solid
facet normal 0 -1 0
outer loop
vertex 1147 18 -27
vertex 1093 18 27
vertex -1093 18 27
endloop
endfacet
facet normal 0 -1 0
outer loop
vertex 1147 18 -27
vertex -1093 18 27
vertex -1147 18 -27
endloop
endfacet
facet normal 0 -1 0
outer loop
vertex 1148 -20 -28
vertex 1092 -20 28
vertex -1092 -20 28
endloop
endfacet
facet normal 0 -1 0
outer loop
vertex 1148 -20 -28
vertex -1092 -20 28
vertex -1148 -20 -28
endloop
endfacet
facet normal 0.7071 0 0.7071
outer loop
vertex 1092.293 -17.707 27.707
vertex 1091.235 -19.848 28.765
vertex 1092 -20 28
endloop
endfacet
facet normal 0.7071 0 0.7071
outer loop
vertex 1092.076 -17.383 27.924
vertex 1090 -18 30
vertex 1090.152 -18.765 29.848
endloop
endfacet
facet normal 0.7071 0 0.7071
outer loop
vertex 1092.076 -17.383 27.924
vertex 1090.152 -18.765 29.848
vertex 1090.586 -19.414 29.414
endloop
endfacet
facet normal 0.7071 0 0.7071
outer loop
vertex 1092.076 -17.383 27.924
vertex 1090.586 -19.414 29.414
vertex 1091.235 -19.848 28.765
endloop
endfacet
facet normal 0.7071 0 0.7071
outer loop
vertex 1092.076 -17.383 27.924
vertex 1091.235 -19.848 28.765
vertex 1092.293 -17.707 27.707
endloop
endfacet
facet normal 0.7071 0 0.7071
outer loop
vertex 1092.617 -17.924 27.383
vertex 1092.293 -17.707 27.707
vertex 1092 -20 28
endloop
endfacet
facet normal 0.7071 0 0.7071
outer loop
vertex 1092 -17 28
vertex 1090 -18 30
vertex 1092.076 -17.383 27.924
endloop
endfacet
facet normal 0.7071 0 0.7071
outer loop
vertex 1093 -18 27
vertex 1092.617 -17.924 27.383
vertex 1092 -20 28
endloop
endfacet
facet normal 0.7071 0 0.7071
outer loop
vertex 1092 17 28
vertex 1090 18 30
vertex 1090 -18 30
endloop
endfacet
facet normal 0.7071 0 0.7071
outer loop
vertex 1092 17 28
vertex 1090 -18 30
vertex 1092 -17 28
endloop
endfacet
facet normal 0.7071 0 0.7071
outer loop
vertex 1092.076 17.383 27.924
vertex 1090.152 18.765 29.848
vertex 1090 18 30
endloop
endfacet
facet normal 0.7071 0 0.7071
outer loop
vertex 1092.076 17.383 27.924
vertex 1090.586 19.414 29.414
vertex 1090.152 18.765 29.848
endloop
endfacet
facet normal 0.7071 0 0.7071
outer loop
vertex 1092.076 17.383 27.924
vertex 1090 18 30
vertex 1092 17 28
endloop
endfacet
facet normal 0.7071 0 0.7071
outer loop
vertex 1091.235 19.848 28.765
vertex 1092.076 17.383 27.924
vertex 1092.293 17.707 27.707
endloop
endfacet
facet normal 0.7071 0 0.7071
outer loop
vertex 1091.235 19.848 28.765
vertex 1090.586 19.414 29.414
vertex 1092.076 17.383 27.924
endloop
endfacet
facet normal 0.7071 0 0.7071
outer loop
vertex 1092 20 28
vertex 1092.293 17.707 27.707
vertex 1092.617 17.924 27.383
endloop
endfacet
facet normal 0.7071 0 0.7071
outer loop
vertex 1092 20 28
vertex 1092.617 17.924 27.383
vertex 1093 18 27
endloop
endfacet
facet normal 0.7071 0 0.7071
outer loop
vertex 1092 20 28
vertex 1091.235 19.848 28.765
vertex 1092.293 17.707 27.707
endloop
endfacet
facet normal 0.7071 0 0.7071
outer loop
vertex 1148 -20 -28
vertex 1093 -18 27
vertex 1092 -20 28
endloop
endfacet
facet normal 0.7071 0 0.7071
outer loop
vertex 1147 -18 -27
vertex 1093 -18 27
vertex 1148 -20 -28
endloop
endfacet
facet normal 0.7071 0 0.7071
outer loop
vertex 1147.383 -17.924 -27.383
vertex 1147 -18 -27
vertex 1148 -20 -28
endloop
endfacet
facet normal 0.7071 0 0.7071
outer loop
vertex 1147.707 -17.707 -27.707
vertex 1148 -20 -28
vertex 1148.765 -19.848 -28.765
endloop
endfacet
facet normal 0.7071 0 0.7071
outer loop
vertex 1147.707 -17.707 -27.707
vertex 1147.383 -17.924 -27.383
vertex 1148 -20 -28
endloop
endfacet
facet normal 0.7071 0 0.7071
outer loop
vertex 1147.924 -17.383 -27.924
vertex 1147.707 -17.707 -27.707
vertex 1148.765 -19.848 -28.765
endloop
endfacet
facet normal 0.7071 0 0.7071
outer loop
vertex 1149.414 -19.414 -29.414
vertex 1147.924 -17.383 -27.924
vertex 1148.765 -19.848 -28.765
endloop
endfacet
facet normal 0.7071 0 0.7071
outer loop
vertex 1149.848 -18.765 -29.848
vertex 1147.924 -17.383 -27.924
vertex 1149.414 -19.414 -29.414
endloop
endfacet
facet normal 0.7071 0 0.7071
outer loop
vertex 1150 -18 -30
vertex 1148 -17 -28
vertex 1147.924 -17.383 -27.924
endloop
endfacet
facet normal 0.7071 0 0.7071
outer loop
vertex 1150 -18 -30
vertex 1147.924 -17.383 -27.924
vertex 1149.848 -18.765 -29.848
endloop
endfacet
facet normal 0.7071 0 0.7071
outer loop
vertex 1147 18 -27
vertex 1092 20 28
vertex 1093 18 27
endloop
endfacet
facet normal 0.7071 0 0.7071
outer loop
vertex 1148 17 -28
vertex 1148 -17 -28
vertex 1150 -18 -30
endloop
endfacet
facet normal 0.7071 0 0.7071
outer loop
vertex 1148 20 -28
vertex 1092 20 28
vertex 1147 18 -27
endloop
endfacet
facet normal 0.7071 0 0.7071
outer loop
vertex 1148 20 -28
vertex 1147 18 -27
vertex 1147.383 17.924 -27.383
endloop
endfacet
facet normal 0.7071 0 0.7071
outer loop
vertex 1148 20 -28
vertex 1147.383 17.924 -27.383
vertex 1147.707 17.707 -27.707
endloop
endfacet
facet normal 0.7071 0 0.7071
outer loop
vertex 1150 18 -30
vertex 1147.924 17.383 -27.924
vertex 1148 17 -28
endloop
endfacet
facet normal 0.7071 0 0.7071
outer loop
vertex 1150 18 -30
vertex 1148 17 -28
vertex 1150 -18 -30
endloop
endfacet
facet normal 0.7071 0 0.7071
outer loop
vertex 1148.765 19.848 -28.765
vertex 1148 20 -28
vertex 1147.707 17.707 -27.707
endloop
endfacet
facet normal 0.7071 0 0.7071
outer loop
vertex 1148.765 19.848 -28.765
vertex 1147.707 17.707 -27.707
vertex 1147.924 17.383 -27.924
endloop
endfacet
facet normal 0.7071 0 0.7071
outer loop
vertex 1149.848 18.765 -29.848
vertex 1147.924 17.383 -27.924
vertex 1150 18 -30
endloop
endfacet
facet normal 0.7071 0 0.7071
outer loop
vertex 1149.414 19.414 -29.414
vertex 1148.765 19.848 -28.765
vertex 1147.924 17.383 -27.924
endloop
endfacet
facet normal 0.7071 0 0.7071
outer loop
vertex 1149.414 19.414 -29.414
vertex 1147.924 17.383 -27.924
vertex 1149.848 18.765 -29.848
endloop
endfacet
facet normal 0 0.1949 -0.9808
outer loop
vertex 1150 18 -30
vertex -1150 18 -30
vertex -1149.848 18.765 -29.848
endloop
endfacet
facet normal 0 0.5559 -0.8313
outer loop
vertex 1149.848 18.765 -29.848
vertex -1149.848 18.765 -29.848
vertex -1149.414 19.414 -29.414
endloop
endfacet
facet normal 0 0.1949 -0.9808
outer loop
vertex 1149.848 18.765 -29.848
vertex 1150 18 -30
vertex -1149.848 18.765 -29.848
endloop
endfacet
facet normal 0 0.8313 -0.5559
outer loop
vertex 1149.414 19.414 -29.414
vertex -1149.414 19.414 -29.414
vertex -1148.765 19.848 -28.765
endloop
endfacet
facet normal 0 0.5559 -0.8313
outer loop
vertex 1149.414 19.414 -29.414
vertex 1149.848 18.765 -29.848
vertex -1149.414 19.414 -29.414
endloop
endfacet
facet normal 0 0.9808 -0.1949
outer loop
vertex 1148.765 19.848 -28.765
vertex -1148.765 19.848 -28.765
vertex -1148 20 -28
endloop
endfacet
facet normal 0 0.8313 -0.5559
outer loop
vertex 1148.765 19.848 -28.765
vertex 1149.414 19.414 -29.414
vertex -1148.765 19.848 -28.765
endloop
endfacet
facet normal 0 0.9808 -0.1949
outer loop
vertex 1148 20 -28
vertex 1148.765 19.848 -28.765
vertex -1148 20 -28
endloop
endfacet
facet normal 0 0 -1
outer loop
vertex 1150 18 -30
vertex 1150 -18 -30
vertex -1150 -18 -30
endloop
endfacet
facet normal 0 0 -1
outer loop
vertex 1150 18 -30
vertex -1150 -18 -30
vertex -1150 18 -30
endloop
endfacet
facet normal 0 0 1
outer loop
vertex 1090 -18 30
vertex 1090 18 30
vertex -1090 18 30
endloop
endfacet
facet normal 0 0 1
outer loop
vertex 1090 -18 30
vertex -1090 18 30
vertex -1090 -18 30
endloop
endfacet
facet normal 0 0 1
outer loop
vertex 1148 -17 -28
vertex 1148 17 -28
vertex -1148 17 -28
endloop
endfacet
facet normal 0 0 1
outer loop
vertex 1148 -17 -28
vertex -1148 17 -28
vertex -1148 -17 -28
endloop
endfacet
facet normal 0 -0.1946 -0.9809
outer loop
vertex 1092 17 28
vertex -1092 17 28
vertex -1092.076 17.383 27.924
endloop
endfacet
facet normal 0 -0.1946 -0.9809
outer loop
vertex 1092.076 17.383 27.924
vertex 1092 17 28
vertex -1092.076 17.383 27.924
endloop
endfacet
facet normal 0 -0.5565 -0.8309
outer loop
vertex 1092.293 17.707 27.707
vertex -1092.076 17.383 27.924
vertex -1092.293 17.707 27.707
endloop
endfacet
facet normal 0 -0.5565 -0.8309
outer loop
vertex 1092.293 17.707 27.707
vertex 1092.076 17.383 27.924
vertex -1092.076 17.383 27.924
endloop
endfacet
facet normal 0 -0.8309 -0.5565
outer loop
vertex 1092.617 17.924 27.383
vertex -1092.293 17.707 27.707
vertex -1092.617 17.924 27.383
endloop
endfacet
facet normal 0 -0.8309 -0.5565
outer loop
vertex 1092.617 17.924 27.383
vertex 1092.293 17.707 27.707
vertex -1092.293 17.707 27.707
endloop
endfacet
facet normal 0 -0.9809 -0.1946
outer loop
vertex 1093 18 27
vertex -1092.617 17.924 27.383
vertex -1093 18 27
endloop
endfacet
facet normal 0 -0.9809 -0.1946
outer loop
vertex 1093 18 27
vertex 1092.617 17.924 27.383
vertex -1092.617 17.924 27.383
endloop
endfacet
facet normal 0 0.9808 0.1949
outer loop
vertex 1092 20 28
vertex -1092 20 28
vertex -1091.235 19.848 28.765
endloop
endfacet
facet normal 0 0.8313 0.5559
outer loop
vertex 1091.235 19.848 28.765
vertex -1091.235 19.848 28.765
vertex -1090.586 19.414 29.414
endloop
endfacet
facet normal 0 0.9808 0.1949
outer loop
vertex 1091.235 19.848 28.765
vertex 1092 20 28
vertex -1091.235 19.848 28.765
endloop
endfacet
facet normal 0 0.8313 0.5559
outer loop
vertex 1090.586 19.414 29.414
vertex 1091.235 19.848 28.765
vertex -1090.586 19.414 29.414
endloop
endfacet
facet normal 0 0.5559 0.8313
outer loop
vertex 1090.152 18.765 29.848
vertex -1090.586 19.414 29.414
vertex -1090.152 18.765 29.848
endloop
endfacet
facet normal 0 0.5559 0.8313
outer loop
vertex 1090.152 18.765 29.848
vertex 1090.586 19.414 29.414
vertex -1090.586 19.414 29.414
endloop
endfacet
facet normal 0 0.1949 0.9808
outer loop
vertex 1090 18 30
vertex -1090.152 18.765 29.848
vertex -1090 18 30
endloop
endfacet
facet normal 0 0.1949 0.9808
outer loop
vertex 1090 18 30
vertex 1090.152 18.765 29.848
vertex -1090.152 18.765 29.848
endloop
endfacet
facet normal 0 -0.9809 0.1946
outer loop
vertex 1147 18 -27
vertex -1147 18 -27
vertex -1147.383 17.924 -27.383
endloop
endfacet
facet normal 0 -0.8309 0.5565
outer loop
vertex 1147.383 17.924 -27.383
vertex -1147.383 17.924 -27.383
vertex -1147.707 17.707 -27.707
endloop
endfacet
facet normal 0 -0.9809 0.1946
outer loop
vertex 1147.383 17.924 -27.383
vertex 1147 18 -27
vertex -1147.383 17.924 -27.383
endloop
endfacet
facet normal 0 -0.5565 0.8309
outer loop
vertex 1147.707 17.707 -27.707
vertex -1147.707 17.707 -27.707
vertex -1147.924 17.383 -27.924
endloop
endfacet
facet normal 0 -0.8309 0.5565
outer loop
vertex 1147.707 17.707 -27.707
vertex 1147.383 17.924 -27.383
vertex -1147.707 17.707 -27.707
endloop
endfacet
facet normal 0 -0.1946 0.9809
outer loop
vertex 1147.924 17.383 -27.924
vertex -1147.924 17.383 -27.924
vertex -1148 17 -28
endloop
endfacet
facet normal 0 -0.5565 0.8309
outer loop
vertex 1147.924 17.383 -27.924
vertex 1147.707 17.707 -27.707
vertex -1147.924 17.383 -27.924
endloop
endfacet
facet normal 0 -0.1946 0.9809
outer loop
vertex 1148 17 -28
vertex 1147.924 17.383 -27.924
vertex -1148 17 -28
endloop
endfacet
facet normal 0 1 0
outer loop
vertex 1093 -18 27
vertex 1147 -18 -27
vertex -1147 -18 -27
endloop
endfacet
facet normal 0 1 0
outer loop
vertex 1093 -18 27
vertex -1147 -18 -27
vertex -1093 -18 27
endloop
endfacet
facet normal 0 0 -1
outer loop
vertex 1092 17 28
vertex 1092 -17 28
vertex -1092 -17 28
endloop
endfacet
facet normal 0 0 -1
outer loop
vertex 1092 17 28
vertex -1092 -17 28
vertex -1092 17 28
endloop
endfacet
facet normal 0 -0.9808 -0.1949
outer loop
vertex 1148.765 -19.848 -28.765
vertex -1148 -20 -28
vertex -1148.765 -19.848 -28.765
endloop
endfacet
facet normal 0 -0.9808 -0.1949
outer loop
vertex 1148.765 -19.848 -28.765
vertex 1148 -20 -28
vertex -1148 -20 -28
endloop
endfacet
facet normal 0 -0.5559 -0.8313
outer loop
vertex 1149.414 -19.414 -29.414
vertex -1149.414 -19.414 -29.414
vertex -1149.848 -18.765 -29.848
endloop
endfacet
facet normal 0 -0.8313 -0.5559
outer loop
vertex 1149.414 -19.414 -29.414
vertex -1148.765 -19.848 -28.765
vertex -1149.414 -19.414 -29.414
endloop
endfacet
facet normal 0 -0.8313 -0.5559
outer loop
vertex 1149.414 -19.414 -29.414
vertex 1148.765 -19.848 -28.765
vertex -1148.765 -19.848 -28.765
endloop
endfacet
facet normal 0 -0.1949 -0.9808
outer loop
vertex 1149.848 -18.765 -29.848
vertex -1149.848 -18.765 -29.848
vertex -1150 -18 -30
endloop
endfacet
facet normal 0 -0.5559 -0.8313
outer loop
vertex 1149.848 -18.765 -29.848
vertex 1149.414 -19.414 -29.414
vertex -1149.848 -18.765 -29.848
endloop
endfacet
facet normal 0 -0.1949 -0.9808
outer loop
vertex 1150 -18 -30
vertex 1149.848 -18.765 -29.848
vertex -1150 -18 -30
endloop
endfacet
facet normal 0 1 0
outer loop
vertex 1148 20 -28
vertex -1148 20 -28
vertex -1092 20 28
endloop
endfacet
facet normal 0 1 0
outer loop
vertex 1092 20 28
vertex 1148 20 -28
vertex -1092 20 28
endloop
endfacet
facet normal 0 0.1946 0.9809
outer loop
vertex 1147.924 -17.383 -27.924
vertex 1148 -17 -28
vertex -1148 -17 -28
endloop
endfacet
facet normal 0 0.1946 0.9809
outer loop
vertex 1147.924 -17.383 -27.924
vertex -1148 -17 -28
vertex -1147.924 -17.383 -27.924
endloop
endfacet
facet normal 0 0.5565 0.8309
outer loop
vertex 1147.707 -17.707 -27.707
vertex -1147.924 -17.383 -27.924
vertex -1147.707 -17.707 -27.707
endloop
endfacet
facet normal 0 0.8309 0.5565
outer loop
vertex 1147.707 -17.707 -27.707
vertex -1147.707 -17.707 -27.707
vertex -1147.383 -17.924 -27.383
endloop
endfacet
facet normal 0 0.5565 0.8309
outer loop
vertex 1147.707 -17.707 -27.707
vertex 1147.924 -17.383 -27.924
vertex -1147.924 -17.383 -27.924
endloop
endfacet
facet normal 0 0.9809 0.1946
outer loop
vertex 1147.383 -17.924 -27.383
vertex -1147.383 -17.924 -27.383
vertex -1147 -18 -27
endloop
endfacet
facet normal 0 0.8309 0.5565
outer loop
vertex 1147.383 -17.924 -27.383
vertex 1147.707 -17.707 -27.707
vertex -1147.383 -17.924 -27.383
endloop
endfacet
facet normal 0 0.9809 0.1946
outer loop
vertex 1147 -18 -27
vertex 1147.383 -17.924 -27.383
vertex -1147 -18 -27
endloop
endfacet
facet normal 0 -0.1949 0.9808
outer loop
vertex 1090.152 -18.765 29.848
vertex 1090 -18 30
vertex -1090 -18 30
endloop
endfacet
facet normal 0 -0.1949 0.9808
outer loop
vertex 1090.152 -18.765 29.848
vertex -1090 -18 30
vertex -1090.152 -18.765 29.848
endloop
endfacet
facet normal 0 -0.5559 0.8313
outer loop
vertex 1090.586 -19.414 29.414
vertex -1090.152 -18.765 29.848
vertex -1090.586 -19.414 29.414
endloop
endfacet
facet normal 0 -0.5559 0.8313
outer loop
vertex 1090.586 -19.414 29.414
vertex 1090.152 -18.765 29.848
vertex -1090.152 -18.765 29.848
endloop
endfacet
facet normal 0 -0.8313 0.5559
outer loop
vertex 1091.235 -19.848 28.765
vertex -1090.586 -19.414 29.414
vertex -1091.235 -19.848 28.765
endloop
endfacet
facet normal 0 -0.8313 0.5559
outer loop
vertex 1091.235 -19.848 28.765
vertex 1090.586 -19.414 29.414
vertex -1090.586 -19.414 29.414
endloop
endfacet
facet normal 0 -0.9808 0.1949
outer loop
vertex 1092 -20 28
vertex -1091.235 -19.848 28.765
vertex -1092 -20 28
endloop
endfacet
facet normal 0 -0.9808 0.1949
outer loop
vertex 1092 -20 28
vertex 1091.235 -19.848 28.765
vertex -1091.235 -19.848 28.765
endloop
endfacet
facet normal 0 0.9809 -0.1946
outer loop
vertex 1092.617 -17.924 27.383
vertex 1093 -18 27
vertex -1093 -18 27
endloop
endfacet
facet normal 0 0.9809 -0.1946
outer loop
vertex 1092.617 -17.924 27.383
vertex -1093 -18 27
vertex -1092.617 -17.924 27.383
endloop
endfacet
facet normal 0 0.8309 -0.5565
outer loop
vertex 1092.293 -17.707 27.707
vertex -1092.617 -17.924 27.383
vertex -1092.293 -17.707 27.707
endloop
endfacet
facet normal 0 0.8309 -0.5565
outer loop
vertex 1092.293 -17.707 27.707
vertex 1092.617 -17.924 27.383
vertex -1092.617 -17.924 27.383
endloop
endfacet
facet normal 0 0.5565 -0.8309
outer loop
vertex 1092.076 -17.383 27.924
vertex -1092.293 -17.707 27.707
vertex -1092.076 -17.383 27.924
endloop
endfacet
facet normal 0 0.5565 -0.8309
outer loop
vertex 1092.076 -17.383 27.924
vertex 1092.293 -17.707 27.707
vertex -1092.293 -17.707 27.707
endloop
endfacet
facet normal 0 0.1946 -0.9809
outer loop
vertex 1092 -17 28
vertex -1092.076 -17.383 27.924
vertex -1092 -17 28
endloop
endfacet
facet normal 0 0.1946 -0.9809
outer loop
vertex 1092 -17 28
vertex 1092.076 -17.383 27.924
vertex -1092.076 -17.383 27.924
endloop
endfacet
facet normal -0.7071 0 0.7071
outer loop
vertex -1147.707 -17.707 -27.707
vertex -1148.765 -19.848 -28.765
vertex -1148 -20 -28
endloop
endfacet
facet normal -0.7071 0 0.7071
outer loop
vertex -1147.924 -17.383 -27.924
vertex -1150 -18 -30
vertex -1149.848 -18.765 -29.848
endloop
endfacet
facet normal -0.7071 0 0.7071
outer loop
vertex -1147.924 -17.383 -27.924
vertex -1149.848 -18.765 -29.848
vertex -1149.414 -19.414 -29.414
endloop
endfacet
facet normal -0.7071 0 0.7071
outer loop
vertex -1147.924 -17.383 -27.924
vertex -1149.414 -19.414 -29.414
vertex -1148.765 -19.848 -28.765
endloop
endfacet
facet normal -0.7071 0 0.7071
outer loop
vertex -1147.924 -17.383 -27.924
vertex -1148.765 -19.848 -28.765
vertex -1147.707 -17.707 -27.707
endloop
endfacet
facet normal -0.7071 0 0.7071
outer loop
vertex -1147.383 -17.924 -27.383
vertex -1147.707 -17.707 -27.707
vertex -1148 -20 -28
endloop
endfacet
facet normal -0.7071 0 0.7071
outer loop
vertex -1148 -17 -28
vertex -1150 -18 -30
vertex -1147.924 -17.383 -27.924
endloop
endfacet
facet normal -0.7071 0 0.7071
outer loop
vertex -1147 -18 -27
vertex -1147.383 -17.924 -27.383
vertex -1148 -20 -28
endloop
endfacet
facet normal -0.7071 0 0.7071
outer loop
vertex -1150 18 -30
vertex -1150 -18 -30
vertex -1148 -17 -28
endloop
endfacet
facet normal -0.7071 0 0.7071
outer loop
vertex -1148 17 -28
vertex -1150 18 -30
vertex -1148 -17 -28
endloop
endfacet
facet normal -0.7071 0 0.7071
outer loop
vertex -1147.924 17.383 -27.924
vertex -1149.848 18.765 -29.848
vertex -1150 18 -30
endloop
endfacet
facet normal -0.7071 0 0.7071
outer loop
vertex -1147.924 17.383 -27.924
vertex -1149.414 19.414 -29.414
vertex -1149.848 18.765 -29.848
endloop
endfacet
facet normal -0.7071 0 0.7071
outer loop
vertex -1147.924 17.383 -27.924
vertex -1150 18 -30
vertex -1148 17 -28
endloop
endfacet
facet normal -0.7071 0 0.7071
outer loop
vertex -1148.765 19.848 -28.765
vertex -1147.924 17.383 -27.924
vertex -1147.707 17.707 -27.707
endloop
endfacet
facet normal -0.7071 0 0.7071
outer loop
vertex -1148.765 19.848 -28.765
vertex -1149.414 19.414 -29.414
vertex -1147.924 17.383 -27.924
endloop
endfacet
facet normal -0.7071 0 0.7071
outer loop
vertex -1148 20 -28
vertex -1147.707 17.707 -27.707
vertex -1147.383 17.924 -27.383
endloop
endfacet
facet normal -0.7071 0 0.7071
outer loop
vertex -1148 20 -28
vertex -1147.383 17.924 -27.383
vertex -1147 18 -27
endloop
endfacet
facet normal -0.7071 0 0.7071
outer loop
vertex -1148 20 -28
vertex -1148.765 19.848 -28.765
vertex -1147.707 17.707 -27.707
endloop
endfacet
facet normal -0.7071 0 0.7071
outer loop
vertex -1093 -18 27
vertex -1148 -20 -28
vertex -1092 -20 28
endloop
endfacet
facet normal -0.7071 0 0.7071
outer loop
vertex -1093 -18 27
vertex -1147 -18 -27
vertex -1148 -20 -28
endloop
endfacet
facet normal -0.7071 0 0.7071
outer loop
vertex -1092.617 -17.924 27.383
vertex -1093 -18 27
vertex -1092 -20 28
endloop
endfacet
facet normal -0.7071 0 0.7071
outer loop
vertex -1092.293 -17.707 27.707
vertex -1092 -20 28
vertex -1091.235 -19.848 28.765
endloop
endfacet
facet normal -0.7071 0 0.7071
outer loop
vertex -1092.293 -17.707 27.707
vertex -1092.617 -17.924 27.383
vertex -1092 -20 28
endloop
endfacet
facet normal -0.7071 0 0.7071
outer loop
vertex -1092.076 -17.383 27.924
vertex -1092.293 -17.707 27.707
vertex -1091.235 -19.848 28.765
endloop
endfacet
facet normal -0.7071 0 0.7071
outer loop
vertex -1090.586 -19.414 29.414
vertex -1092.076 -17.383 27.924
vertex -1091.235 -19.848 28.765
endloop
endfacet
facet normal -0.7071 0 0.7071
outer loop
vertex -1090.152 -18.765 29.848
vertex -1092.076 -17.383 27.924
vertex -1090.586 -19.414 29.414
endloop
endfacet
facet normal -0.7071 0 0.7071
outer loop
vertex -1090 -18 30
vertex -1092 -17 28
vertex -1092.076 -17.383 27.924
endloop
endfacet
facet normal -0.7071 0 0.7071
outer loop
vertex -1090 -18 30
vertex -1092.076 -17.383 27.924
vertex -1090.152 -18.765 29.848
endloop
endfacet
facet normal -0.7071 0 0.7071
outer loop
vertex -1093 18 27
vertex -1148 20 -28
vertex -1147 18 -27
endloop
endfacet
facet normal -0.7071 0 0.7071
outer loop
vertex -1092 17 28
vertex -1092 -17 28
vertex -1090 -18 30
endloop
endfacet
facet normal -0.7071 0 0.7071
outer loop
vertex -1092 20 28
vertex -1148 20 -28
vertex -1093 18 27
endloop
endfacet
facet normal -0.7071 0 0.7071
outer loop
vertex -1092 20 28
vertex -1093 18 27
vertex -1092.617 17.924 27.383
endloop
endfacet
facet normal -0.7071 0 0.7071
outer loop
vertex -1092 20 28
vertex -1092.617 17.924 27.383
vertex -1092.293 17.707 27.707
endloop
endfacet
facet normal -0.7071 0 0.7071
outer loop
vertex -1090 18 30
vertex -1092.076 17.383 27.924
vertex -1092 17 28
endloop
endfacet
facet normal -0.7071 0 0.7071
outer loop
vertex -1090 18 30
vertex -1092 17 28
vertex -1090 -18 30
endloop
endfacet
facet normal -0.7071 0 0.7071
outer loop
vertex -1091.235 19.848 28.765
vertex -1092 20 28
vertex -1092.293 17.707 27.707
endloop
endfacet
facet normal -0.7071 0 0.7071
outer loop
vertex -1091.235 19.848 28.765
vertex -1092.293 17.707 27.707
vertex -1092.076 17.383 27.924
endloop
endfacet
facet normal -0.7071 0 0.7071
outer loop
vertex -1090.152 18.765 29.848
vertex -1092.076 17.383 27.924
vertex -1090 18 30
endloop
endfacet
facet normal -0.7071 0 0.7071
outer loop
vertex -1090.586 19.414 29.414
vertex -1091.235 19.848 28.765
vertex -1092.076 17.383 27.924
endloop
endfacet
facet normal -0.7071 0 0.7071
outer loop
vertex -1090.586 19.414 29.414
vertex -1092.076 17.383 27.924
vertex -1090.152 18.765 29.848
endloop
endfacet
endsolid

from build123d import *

# Parameters (mm, degrees)
F1_DEPTH      = 1150
F1_DEPTH_BACK = 1150
F3_DEPTH      = 25
F3_DEPTH_BACK = 25


with BuildPart() as f1:
    # F0 (on Right) → F1 (new body, two sides)
    with BuildSketch(Plane.YZ) as f1_sk:
        with BuildLine():
            ThreePointArc((-20, -28), (-19.4142135624, -29.4142135624), (-18, -30))
            Line((-18, -30), (18, -30))
            ThreePointArc((18, -30), (19.4142135624, -29.4142135624), (20, -28))
            Line((20, -28), (20, 28))
            ThreePointArc((20, 28), (19.4142135624, 29.4142135624), (18, 30))
            Line((18, 30), (-18, 30))
            ThreePointArc((-18, 30), (-19.4142135624, 29.4142135624), (-20, 28))
            Line((-20, 28), (-20, -28))
        make_face()
        with BuildLine():
            Line((17, -28), (-17, -28))
            ThreePointArc((-17, -28), (-17.7071067812, -27.7071067812), (-18, -27))
            Line((-18, -27), (-18, 27))
            ThreePointArc((-18, 27), (-17.7071067812, 27.7071067812), (-17, 28))
            Line((-17, 28), (17, 28))
            ThreePointArc((17, 28), (17.7071067812, 27.7071067812), (18, 27))
            Line((18, 27), (18, -27))
            ThreePointArc((18, -27), (17.7071067812, -27.7071067812), (17, -28))
        make_face(mode=Mode.SUBTRACT)
    extrude(amount=F1_DEPTH)
    extrude(f1_sk.sketch, amount=-F1_DEPTH_BACK)

    # F2 (on Front) → F3 (cut, two sides)
    with BuildSketch(Plane.XZ) as f3_sk:
        Polygon((-1150, 30), (-1150, -30), (-1090, 30), align=None)
        Polygon((1090, 30), (1150, -30), (1150, 30), align=None)
    extrude(amount=-F3_DEPTH, mode=Mode.SUBTRACT)
    extrude(f3_sk.sketch, amount=F3_DEPTH_BACK, mode=Mode.SUBTRACT)


solid = f1.part
